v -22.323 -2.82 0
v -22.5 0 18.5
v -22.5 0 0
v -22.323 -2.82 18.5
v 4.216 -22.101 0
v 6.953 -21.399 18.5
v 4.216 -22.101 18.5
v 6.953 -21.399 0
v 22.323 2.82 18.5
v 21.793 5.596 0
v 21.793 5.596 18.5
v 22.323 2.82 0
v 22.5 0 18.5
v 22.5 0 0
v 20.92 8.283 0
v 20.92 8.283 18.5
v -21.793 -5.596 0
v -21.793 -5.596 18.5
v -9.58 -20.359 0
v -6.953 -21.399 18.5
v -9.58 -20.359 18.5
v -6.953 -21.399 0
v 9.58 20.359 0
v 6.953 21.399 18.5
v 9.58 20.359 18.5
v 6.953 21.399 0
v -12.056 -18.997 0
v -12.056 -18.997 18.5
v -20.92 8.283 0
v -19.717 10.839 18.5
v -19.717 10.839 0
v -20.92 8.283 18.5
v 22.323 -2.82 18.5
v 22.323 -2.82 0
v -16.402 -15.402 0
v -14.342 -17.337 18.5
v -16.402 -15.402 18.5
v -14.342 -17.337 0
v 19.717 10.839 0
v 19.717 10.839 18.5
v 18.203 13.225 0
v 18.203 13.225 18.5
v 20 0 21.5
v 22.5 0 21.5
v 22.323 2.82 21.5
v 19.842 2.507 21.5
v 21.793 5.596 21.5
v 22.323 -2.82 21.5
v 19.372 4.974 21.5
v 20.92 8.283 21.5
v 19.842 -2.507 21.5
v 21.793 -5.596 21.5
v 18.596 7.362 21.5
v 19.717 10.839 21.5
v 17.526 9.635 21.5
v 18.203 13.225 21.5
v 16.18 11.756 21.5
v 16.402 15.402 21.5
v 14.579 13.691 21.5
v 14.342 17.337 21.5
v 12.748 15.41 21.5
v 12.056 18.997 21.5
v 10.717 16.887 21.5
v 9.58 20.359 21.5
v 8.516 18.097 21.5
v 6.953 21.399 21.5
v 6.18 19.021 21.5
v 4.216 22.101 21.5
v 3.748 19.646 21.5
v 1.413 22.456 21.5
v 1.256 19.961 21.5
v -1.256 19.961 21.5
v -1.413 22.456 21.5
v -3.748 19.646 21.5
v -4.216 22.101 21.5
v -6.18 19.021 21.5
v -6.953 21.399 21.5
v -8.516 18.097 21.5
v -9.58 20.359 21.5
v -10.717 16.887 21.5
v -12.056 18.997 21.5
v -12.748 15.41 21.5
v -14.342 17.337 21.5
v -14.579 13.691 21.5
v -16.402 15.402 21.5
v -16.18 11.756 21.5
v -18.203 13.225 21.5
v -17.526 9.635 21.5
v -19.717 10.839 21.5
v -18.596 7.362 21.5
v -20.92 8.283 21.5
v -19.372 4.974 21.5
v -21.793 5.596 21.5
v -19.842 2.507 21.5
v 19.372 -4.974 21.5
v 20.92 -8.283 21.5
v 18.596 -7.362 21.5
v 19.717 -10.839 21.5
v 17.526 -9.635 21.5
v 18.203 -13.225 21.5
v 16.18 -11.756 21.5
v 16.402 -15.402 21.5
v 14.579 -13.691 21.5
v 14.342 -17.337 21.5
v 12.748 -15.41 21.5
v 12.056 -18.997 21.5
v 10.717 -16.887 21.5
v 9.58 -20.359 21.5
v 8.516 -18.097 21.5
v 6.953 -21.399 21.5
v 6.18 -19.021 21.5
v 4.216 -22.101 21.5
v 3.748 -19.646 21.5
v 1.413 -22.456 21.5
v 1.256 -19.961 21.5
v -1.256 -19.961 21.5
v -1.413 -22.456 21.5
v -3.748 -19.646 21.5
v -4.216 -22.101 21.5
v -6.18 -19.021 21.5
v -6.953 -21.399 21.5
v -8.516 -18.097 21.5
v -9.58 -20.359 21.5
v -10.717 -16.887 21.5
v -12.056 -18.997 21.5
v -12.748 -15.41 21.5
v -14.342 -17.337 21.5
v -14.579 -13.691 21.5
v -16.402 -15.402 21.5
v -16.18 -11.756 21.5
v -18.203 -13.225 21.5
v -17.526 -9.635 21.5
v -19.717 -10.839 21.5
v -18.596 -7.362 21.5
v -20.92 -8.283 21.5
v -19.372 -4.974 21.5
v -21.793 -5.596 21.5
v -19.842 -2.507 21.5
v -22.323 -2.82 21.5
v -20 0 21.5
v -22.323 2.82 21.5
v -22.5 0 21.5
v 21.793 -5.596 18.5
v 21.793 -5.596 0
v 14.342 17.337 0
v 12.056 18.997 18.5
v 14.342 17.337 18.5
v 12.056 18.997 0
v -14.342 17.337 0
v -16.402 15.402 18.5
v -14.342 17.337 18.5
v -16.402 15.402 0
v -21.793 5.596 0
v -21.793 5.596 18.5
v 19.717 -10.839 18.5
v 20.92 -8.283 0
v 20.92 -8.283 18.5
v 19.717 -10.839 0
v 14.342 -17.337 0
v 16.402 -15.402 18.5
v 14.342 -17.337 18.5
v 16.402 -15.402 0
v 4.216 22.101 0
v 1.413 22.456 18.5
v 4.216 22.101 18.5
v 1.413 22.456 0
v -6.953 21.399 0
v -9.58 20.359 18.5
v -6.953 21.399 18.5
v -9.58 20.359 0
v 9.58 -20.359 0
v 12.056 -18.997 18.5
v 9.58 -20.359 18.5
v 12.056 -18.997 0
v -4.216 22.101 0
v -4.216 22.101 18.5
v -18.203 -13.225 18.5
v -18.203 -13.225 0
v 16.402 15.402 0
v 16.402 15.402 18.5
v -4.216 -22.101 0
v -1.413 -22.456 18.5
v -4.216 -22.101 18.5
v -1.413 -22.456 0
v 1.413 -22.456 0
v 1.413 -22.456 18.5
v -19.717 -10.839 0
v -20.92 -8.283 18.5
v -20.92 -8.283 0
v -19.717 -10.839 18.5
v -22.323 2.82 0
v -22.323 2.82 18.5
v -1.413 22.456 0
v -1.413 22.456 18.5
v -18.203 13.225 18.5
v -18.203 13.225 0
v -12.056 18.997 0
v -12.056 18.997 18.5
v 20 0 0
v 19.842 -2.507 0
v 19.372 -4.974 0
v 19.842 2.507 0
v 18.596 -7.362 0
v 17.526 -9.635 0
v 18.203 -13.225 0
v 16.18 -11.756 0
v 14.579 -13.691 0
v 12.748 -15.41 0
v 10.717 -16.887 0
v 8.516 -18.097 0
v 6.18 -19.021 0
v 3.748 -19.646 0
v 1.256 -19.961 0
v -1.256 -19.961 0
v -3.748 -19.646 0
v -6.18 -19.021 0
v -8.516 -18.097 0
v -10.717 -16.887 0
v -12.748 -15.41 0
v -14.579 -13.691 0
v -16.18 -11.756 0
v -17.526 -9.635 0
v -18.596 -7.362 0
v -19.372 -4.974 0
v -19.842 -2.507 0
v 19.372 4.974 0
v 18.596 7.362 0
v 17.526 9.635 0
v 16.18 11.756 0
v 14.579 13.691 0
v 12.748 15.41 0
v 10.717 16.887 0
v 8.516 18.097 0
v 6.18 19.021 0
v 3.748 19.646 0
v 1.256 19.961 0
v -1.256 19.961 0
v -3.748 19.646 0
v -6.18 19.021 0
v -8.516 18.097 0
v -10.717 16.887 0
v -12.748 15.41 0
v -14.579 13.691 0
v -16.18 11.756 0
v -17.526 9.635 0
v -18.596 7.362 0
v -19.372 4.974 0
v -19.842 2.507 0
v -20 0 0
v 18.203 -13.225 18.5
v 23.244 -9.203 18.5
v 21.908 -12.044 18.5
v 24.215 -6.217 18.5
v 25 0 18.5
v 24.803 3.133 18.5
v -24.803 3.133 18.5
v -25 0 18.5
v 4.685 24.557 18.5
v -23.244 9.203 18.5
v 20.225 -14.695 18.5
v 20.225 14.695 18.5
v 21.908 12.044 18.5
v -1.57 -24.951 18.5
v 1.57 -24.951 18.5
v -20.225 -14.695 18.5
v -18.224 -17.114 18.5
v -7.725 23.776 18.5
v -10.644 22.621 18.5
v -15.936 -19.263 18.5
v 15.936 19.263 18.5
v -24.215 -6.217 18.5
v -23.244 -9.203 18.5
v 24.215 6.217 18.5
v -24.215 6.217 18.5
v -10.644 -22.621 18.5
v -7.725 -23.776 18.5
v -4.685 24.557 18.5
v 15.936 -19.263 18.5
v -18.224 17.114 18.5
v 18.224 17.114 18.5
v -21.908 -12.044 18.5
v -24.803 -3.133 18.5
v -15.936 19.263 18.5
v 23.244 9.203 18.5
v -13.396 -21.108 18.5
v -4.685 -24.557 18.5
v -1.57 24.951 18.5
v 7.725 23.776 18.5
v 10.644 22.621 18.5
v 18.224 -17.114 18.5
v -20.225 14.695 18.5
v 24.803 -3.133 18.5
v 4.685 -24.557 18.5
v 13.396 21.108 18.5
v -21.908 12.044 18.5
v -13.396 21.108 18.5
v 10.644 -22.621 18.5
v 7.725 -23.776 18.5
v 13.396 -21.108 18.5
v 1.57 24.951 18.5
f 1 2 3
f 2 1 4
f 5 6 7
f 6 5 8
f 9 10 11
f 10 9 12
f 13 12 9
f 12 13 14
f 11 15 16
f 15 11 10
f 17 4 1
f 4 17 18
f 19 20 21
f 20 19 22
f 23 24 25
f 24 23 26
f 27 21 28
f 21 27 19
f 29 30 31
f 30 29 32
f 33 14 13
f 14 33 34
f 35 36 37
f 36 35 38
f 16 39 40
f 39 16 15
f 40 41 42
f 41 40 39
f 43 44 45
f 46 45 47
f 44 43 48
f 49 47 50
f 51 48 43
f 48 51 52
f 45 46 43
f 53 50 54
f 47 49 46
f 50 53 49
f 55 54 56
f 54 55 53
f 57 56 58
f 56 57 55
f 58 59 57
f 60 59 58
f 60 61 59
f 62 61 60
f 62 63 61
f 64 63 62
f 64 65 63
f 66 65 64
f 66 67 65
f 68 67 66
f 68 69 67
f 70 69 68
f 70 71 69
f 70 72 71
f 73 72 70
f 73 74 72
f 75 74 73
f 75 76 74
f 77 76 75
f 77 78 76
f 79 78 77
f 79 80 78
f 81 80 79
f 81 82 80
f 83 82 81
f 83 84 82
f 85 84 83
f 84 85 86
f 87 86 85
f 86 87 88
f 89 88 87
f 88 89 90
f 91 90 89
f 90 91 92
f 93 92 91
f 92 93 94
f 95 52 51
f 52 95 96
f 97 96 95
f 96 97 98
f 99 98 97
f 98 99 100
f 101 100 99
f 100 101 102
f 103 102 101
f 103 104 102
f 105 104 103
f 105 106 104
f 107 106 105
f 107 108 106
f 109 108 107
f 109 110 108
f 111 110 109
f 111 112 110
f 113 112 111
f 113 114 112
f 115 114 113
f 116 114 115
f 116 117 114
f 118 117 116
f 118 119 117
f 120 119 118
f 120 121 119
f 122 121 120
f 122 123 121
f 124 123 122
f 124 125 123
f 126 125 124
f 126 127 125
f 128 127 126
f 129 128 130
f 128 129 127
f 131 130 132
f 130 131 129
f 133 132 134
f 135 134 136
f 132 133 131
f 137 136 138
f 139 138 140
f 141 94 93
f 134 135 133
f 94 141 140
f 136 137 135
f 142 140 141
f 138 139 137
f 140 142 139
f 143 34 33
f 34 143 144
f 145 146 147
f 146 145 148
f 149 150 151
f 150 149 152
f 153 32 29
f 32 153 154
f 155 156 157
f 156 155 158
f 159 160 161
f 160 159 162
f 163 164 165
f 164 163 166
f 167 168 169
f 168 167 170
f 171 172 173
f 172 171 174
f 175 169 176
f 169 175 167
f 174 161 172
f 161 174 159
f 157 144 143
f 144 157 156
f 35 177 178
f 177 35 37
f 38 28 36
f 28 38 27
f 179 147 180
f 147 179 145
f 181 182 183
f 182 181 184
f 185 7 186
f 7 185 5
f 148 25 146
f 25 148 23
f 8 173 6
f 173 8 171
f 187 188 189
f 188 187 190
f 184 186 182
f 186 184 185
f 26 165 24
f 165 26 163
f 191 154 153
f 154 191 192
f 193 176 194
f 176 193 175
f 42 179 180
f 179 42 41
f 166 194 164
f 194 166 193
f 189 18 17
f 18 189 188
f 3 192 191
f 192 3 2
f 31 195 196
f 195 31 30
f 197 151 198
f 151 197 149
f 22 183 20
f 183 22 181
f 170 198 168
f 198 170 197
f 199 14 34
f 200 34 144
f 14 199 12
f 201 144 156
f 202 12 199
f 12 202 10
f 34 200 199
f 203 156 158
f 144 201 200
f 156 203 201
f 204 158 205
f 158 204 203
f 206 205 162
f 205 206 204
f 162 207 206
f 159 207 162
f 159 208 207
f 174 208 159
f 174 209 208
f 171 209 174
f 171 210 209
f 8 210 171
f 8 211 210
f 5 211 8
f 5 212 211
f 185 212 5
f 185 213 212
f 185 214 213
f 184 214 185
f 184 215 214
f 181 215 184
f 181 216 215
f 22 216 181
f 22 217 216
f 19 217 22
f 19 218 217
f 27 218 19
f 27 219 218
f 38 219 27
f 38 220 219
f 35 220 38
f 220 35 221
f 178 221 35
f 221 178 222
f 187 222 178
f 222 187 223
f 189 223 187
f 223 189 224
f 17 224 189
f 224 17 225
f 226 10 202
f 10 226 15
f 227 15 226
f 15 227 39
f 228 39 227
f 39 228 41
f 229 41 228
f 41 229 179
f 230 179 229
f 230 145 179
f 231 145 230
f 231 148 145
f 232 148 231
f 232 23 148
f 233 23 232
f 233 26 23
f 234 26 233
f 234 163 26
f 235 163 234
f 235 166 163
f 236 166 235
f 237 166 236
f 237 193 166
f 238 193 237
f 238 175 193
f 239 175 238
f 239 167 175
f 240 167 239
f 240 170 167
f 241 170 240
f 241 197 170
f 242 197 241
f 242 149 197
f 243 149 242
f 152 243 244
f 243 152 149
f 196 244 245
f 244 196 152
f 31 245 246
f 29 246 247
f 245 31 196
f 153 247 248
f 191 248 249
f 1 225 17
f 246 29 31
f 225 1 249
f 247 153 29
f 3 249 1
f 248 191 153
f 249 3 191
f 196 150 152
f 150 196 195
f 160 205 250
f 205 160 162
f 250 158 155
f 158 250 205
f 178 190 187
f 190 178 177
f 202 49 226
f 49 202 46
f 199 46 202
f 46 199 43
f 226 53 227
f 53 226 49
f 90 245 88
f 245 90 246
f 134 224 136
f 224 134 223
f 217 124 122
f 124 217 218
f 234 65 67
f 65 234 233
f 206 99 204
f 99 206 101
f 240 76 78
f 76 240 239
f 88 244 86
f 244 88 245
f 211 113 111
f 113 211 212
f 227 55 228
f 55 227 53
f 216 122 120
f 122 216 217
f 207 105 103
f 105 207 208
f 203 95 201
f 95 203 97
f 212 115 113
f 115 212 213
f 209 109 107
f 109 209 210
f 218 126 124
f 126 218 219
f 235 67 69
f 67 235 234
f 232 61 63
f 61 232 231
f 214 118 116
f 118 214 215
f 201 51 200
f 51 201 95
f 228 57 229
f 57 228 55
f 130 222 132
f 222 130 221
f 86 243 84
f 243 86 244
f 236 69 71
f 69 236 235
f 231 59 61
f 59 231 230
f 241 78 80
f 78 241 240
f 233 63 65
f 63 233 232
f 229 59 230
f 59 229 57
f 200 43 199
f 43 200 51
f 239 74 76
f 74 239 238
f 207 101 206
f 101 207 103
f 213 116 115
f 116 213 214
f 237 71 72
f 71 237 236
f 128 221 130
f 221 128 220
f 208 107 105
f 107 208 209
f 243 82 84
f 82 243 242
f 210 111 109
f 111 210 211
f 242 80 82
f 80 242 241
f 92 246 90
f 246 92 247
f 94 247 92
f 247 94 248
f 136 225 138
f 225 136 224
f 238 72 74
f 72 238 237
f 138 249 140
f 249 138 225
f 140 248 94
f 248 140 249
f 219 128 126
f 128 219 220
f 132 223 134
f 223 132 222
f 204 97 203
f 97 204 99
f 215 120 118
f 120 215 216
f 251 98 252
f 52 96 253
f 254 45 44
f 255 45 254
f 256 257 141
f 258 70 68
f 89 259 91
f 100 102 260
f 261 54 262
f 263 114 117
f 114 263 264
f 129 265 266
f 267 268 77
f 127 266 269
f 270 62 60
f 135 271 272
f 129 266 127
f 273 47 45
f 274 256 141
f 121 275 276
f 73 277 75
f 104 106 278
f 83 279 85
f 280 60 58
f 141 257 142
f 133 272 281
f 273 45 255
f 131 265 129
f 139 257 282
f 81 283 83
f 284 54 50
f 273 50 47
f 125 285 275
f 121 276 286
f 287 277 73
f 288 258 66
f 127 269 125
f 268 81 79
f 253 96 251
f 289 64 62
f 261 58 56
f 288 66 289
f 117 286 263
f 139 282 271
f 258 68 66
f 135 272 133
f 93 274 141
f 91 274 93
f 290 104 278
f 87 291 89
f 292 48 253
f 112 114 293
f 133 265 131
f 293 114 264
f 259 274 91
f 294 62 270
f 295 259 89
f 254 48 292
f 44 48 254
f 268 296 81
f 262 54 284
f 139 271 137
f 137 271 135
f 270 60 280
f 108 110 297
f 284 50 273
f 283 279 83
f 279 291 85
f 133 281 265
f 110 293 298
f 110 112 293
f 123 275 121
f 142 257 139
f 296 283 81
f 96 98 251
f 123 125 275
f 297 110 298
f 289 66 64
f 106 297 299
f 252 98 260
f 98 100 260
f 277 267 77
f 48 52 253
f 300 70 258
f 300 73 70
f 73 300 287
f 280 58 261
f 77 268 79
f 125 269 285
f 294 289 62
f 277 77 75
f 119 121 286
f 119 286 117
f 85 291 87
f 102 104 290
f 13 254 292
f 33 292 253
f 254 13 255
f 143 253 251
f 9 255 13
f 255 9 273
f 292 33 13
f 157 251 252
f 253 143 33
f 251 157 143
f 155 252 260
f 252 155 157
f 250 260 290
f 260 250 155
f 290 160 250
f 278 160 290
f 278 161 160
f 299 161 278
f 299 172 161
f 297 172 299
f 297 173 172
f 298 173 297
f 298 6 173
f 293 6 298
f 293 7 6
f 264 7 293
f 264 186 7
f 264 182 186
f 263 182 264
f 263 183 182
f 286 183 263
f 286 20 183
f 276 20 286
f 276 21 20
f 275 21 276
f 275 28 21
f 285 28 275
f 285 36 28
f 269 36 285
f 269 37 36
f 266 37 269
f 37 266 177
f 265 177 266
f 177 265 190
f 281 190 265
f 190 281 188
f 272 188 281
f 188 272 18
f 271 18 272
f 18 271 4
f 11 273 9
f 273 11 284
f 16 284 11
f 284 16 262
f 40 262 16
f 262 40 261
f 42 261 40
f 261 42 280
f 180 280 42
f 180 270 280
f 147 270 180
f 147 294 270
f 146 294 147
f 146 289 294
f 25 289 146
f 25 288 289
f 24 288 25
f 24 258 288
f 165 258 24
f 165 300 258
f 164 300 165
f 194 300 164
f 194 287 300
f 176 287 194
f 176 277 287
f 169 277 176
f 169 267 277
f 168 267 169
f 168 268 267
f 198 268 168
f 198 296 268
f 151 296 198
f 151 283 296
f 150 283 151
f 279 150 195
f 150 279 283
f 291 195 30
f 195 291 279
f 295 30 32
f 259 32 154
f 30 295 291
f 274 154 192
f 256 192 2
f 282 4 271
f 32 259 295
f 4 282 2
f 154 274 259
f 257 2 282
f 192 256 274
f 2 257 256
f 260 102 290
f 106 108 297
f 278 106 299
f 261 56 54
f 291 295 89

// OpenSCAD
/*
Author: Kevin Lutzer
Date Created: Oct 8 2016 
Description: A part to protect a hole in a desk meant for threading cables through.
*/

///////////////////////////////////////////////// Parameter /////////////////////////////////////////////////

// The thickness of the cyclinder that will slide into the desk hole
hole_cover_wall_thickness = 5;
// Diameter of the hole in the desk
hole_diameter = 45;
// The depth of the whole in the desk
hole_height = 18.5;

// The height of the cover from the base of the desk to the top of the cover
desk_cover_height = 3; 
// The thickness of the desk cover
desk_cover_thickness = 5;


///////////////////////////////////////////////// Prototypes /////////////////////////////////////////////////
union()
{
    difference(){
        cylinder(hole_height + desk_cover_height, d1 = hole_diameter, d2 = hole_diameter, 0, $fn=50 );
        cylinder(hole_height + desk_cover_height, d1 = (hole_diameter-hole_cover_wall_thickness), d2 = (hole_diameter-hole_cover_wall_thickness), 0, $fn=50);
    }
    translate([0,0,hole_height]){
        difference(){
            cylinder(desk_cover_height, d1 = (hole_diameter+desk_cover_thickness), d2 = (hole_diameter), 0, $fn=50);
            cylinder(desk_cover_height, d1 = hole_diameter, d2 = hole_diameter, 0, $fn=50);    
        }
        
    }
}
////////////////////////////////////////////////// modules //////////////////////////////////////////////////
